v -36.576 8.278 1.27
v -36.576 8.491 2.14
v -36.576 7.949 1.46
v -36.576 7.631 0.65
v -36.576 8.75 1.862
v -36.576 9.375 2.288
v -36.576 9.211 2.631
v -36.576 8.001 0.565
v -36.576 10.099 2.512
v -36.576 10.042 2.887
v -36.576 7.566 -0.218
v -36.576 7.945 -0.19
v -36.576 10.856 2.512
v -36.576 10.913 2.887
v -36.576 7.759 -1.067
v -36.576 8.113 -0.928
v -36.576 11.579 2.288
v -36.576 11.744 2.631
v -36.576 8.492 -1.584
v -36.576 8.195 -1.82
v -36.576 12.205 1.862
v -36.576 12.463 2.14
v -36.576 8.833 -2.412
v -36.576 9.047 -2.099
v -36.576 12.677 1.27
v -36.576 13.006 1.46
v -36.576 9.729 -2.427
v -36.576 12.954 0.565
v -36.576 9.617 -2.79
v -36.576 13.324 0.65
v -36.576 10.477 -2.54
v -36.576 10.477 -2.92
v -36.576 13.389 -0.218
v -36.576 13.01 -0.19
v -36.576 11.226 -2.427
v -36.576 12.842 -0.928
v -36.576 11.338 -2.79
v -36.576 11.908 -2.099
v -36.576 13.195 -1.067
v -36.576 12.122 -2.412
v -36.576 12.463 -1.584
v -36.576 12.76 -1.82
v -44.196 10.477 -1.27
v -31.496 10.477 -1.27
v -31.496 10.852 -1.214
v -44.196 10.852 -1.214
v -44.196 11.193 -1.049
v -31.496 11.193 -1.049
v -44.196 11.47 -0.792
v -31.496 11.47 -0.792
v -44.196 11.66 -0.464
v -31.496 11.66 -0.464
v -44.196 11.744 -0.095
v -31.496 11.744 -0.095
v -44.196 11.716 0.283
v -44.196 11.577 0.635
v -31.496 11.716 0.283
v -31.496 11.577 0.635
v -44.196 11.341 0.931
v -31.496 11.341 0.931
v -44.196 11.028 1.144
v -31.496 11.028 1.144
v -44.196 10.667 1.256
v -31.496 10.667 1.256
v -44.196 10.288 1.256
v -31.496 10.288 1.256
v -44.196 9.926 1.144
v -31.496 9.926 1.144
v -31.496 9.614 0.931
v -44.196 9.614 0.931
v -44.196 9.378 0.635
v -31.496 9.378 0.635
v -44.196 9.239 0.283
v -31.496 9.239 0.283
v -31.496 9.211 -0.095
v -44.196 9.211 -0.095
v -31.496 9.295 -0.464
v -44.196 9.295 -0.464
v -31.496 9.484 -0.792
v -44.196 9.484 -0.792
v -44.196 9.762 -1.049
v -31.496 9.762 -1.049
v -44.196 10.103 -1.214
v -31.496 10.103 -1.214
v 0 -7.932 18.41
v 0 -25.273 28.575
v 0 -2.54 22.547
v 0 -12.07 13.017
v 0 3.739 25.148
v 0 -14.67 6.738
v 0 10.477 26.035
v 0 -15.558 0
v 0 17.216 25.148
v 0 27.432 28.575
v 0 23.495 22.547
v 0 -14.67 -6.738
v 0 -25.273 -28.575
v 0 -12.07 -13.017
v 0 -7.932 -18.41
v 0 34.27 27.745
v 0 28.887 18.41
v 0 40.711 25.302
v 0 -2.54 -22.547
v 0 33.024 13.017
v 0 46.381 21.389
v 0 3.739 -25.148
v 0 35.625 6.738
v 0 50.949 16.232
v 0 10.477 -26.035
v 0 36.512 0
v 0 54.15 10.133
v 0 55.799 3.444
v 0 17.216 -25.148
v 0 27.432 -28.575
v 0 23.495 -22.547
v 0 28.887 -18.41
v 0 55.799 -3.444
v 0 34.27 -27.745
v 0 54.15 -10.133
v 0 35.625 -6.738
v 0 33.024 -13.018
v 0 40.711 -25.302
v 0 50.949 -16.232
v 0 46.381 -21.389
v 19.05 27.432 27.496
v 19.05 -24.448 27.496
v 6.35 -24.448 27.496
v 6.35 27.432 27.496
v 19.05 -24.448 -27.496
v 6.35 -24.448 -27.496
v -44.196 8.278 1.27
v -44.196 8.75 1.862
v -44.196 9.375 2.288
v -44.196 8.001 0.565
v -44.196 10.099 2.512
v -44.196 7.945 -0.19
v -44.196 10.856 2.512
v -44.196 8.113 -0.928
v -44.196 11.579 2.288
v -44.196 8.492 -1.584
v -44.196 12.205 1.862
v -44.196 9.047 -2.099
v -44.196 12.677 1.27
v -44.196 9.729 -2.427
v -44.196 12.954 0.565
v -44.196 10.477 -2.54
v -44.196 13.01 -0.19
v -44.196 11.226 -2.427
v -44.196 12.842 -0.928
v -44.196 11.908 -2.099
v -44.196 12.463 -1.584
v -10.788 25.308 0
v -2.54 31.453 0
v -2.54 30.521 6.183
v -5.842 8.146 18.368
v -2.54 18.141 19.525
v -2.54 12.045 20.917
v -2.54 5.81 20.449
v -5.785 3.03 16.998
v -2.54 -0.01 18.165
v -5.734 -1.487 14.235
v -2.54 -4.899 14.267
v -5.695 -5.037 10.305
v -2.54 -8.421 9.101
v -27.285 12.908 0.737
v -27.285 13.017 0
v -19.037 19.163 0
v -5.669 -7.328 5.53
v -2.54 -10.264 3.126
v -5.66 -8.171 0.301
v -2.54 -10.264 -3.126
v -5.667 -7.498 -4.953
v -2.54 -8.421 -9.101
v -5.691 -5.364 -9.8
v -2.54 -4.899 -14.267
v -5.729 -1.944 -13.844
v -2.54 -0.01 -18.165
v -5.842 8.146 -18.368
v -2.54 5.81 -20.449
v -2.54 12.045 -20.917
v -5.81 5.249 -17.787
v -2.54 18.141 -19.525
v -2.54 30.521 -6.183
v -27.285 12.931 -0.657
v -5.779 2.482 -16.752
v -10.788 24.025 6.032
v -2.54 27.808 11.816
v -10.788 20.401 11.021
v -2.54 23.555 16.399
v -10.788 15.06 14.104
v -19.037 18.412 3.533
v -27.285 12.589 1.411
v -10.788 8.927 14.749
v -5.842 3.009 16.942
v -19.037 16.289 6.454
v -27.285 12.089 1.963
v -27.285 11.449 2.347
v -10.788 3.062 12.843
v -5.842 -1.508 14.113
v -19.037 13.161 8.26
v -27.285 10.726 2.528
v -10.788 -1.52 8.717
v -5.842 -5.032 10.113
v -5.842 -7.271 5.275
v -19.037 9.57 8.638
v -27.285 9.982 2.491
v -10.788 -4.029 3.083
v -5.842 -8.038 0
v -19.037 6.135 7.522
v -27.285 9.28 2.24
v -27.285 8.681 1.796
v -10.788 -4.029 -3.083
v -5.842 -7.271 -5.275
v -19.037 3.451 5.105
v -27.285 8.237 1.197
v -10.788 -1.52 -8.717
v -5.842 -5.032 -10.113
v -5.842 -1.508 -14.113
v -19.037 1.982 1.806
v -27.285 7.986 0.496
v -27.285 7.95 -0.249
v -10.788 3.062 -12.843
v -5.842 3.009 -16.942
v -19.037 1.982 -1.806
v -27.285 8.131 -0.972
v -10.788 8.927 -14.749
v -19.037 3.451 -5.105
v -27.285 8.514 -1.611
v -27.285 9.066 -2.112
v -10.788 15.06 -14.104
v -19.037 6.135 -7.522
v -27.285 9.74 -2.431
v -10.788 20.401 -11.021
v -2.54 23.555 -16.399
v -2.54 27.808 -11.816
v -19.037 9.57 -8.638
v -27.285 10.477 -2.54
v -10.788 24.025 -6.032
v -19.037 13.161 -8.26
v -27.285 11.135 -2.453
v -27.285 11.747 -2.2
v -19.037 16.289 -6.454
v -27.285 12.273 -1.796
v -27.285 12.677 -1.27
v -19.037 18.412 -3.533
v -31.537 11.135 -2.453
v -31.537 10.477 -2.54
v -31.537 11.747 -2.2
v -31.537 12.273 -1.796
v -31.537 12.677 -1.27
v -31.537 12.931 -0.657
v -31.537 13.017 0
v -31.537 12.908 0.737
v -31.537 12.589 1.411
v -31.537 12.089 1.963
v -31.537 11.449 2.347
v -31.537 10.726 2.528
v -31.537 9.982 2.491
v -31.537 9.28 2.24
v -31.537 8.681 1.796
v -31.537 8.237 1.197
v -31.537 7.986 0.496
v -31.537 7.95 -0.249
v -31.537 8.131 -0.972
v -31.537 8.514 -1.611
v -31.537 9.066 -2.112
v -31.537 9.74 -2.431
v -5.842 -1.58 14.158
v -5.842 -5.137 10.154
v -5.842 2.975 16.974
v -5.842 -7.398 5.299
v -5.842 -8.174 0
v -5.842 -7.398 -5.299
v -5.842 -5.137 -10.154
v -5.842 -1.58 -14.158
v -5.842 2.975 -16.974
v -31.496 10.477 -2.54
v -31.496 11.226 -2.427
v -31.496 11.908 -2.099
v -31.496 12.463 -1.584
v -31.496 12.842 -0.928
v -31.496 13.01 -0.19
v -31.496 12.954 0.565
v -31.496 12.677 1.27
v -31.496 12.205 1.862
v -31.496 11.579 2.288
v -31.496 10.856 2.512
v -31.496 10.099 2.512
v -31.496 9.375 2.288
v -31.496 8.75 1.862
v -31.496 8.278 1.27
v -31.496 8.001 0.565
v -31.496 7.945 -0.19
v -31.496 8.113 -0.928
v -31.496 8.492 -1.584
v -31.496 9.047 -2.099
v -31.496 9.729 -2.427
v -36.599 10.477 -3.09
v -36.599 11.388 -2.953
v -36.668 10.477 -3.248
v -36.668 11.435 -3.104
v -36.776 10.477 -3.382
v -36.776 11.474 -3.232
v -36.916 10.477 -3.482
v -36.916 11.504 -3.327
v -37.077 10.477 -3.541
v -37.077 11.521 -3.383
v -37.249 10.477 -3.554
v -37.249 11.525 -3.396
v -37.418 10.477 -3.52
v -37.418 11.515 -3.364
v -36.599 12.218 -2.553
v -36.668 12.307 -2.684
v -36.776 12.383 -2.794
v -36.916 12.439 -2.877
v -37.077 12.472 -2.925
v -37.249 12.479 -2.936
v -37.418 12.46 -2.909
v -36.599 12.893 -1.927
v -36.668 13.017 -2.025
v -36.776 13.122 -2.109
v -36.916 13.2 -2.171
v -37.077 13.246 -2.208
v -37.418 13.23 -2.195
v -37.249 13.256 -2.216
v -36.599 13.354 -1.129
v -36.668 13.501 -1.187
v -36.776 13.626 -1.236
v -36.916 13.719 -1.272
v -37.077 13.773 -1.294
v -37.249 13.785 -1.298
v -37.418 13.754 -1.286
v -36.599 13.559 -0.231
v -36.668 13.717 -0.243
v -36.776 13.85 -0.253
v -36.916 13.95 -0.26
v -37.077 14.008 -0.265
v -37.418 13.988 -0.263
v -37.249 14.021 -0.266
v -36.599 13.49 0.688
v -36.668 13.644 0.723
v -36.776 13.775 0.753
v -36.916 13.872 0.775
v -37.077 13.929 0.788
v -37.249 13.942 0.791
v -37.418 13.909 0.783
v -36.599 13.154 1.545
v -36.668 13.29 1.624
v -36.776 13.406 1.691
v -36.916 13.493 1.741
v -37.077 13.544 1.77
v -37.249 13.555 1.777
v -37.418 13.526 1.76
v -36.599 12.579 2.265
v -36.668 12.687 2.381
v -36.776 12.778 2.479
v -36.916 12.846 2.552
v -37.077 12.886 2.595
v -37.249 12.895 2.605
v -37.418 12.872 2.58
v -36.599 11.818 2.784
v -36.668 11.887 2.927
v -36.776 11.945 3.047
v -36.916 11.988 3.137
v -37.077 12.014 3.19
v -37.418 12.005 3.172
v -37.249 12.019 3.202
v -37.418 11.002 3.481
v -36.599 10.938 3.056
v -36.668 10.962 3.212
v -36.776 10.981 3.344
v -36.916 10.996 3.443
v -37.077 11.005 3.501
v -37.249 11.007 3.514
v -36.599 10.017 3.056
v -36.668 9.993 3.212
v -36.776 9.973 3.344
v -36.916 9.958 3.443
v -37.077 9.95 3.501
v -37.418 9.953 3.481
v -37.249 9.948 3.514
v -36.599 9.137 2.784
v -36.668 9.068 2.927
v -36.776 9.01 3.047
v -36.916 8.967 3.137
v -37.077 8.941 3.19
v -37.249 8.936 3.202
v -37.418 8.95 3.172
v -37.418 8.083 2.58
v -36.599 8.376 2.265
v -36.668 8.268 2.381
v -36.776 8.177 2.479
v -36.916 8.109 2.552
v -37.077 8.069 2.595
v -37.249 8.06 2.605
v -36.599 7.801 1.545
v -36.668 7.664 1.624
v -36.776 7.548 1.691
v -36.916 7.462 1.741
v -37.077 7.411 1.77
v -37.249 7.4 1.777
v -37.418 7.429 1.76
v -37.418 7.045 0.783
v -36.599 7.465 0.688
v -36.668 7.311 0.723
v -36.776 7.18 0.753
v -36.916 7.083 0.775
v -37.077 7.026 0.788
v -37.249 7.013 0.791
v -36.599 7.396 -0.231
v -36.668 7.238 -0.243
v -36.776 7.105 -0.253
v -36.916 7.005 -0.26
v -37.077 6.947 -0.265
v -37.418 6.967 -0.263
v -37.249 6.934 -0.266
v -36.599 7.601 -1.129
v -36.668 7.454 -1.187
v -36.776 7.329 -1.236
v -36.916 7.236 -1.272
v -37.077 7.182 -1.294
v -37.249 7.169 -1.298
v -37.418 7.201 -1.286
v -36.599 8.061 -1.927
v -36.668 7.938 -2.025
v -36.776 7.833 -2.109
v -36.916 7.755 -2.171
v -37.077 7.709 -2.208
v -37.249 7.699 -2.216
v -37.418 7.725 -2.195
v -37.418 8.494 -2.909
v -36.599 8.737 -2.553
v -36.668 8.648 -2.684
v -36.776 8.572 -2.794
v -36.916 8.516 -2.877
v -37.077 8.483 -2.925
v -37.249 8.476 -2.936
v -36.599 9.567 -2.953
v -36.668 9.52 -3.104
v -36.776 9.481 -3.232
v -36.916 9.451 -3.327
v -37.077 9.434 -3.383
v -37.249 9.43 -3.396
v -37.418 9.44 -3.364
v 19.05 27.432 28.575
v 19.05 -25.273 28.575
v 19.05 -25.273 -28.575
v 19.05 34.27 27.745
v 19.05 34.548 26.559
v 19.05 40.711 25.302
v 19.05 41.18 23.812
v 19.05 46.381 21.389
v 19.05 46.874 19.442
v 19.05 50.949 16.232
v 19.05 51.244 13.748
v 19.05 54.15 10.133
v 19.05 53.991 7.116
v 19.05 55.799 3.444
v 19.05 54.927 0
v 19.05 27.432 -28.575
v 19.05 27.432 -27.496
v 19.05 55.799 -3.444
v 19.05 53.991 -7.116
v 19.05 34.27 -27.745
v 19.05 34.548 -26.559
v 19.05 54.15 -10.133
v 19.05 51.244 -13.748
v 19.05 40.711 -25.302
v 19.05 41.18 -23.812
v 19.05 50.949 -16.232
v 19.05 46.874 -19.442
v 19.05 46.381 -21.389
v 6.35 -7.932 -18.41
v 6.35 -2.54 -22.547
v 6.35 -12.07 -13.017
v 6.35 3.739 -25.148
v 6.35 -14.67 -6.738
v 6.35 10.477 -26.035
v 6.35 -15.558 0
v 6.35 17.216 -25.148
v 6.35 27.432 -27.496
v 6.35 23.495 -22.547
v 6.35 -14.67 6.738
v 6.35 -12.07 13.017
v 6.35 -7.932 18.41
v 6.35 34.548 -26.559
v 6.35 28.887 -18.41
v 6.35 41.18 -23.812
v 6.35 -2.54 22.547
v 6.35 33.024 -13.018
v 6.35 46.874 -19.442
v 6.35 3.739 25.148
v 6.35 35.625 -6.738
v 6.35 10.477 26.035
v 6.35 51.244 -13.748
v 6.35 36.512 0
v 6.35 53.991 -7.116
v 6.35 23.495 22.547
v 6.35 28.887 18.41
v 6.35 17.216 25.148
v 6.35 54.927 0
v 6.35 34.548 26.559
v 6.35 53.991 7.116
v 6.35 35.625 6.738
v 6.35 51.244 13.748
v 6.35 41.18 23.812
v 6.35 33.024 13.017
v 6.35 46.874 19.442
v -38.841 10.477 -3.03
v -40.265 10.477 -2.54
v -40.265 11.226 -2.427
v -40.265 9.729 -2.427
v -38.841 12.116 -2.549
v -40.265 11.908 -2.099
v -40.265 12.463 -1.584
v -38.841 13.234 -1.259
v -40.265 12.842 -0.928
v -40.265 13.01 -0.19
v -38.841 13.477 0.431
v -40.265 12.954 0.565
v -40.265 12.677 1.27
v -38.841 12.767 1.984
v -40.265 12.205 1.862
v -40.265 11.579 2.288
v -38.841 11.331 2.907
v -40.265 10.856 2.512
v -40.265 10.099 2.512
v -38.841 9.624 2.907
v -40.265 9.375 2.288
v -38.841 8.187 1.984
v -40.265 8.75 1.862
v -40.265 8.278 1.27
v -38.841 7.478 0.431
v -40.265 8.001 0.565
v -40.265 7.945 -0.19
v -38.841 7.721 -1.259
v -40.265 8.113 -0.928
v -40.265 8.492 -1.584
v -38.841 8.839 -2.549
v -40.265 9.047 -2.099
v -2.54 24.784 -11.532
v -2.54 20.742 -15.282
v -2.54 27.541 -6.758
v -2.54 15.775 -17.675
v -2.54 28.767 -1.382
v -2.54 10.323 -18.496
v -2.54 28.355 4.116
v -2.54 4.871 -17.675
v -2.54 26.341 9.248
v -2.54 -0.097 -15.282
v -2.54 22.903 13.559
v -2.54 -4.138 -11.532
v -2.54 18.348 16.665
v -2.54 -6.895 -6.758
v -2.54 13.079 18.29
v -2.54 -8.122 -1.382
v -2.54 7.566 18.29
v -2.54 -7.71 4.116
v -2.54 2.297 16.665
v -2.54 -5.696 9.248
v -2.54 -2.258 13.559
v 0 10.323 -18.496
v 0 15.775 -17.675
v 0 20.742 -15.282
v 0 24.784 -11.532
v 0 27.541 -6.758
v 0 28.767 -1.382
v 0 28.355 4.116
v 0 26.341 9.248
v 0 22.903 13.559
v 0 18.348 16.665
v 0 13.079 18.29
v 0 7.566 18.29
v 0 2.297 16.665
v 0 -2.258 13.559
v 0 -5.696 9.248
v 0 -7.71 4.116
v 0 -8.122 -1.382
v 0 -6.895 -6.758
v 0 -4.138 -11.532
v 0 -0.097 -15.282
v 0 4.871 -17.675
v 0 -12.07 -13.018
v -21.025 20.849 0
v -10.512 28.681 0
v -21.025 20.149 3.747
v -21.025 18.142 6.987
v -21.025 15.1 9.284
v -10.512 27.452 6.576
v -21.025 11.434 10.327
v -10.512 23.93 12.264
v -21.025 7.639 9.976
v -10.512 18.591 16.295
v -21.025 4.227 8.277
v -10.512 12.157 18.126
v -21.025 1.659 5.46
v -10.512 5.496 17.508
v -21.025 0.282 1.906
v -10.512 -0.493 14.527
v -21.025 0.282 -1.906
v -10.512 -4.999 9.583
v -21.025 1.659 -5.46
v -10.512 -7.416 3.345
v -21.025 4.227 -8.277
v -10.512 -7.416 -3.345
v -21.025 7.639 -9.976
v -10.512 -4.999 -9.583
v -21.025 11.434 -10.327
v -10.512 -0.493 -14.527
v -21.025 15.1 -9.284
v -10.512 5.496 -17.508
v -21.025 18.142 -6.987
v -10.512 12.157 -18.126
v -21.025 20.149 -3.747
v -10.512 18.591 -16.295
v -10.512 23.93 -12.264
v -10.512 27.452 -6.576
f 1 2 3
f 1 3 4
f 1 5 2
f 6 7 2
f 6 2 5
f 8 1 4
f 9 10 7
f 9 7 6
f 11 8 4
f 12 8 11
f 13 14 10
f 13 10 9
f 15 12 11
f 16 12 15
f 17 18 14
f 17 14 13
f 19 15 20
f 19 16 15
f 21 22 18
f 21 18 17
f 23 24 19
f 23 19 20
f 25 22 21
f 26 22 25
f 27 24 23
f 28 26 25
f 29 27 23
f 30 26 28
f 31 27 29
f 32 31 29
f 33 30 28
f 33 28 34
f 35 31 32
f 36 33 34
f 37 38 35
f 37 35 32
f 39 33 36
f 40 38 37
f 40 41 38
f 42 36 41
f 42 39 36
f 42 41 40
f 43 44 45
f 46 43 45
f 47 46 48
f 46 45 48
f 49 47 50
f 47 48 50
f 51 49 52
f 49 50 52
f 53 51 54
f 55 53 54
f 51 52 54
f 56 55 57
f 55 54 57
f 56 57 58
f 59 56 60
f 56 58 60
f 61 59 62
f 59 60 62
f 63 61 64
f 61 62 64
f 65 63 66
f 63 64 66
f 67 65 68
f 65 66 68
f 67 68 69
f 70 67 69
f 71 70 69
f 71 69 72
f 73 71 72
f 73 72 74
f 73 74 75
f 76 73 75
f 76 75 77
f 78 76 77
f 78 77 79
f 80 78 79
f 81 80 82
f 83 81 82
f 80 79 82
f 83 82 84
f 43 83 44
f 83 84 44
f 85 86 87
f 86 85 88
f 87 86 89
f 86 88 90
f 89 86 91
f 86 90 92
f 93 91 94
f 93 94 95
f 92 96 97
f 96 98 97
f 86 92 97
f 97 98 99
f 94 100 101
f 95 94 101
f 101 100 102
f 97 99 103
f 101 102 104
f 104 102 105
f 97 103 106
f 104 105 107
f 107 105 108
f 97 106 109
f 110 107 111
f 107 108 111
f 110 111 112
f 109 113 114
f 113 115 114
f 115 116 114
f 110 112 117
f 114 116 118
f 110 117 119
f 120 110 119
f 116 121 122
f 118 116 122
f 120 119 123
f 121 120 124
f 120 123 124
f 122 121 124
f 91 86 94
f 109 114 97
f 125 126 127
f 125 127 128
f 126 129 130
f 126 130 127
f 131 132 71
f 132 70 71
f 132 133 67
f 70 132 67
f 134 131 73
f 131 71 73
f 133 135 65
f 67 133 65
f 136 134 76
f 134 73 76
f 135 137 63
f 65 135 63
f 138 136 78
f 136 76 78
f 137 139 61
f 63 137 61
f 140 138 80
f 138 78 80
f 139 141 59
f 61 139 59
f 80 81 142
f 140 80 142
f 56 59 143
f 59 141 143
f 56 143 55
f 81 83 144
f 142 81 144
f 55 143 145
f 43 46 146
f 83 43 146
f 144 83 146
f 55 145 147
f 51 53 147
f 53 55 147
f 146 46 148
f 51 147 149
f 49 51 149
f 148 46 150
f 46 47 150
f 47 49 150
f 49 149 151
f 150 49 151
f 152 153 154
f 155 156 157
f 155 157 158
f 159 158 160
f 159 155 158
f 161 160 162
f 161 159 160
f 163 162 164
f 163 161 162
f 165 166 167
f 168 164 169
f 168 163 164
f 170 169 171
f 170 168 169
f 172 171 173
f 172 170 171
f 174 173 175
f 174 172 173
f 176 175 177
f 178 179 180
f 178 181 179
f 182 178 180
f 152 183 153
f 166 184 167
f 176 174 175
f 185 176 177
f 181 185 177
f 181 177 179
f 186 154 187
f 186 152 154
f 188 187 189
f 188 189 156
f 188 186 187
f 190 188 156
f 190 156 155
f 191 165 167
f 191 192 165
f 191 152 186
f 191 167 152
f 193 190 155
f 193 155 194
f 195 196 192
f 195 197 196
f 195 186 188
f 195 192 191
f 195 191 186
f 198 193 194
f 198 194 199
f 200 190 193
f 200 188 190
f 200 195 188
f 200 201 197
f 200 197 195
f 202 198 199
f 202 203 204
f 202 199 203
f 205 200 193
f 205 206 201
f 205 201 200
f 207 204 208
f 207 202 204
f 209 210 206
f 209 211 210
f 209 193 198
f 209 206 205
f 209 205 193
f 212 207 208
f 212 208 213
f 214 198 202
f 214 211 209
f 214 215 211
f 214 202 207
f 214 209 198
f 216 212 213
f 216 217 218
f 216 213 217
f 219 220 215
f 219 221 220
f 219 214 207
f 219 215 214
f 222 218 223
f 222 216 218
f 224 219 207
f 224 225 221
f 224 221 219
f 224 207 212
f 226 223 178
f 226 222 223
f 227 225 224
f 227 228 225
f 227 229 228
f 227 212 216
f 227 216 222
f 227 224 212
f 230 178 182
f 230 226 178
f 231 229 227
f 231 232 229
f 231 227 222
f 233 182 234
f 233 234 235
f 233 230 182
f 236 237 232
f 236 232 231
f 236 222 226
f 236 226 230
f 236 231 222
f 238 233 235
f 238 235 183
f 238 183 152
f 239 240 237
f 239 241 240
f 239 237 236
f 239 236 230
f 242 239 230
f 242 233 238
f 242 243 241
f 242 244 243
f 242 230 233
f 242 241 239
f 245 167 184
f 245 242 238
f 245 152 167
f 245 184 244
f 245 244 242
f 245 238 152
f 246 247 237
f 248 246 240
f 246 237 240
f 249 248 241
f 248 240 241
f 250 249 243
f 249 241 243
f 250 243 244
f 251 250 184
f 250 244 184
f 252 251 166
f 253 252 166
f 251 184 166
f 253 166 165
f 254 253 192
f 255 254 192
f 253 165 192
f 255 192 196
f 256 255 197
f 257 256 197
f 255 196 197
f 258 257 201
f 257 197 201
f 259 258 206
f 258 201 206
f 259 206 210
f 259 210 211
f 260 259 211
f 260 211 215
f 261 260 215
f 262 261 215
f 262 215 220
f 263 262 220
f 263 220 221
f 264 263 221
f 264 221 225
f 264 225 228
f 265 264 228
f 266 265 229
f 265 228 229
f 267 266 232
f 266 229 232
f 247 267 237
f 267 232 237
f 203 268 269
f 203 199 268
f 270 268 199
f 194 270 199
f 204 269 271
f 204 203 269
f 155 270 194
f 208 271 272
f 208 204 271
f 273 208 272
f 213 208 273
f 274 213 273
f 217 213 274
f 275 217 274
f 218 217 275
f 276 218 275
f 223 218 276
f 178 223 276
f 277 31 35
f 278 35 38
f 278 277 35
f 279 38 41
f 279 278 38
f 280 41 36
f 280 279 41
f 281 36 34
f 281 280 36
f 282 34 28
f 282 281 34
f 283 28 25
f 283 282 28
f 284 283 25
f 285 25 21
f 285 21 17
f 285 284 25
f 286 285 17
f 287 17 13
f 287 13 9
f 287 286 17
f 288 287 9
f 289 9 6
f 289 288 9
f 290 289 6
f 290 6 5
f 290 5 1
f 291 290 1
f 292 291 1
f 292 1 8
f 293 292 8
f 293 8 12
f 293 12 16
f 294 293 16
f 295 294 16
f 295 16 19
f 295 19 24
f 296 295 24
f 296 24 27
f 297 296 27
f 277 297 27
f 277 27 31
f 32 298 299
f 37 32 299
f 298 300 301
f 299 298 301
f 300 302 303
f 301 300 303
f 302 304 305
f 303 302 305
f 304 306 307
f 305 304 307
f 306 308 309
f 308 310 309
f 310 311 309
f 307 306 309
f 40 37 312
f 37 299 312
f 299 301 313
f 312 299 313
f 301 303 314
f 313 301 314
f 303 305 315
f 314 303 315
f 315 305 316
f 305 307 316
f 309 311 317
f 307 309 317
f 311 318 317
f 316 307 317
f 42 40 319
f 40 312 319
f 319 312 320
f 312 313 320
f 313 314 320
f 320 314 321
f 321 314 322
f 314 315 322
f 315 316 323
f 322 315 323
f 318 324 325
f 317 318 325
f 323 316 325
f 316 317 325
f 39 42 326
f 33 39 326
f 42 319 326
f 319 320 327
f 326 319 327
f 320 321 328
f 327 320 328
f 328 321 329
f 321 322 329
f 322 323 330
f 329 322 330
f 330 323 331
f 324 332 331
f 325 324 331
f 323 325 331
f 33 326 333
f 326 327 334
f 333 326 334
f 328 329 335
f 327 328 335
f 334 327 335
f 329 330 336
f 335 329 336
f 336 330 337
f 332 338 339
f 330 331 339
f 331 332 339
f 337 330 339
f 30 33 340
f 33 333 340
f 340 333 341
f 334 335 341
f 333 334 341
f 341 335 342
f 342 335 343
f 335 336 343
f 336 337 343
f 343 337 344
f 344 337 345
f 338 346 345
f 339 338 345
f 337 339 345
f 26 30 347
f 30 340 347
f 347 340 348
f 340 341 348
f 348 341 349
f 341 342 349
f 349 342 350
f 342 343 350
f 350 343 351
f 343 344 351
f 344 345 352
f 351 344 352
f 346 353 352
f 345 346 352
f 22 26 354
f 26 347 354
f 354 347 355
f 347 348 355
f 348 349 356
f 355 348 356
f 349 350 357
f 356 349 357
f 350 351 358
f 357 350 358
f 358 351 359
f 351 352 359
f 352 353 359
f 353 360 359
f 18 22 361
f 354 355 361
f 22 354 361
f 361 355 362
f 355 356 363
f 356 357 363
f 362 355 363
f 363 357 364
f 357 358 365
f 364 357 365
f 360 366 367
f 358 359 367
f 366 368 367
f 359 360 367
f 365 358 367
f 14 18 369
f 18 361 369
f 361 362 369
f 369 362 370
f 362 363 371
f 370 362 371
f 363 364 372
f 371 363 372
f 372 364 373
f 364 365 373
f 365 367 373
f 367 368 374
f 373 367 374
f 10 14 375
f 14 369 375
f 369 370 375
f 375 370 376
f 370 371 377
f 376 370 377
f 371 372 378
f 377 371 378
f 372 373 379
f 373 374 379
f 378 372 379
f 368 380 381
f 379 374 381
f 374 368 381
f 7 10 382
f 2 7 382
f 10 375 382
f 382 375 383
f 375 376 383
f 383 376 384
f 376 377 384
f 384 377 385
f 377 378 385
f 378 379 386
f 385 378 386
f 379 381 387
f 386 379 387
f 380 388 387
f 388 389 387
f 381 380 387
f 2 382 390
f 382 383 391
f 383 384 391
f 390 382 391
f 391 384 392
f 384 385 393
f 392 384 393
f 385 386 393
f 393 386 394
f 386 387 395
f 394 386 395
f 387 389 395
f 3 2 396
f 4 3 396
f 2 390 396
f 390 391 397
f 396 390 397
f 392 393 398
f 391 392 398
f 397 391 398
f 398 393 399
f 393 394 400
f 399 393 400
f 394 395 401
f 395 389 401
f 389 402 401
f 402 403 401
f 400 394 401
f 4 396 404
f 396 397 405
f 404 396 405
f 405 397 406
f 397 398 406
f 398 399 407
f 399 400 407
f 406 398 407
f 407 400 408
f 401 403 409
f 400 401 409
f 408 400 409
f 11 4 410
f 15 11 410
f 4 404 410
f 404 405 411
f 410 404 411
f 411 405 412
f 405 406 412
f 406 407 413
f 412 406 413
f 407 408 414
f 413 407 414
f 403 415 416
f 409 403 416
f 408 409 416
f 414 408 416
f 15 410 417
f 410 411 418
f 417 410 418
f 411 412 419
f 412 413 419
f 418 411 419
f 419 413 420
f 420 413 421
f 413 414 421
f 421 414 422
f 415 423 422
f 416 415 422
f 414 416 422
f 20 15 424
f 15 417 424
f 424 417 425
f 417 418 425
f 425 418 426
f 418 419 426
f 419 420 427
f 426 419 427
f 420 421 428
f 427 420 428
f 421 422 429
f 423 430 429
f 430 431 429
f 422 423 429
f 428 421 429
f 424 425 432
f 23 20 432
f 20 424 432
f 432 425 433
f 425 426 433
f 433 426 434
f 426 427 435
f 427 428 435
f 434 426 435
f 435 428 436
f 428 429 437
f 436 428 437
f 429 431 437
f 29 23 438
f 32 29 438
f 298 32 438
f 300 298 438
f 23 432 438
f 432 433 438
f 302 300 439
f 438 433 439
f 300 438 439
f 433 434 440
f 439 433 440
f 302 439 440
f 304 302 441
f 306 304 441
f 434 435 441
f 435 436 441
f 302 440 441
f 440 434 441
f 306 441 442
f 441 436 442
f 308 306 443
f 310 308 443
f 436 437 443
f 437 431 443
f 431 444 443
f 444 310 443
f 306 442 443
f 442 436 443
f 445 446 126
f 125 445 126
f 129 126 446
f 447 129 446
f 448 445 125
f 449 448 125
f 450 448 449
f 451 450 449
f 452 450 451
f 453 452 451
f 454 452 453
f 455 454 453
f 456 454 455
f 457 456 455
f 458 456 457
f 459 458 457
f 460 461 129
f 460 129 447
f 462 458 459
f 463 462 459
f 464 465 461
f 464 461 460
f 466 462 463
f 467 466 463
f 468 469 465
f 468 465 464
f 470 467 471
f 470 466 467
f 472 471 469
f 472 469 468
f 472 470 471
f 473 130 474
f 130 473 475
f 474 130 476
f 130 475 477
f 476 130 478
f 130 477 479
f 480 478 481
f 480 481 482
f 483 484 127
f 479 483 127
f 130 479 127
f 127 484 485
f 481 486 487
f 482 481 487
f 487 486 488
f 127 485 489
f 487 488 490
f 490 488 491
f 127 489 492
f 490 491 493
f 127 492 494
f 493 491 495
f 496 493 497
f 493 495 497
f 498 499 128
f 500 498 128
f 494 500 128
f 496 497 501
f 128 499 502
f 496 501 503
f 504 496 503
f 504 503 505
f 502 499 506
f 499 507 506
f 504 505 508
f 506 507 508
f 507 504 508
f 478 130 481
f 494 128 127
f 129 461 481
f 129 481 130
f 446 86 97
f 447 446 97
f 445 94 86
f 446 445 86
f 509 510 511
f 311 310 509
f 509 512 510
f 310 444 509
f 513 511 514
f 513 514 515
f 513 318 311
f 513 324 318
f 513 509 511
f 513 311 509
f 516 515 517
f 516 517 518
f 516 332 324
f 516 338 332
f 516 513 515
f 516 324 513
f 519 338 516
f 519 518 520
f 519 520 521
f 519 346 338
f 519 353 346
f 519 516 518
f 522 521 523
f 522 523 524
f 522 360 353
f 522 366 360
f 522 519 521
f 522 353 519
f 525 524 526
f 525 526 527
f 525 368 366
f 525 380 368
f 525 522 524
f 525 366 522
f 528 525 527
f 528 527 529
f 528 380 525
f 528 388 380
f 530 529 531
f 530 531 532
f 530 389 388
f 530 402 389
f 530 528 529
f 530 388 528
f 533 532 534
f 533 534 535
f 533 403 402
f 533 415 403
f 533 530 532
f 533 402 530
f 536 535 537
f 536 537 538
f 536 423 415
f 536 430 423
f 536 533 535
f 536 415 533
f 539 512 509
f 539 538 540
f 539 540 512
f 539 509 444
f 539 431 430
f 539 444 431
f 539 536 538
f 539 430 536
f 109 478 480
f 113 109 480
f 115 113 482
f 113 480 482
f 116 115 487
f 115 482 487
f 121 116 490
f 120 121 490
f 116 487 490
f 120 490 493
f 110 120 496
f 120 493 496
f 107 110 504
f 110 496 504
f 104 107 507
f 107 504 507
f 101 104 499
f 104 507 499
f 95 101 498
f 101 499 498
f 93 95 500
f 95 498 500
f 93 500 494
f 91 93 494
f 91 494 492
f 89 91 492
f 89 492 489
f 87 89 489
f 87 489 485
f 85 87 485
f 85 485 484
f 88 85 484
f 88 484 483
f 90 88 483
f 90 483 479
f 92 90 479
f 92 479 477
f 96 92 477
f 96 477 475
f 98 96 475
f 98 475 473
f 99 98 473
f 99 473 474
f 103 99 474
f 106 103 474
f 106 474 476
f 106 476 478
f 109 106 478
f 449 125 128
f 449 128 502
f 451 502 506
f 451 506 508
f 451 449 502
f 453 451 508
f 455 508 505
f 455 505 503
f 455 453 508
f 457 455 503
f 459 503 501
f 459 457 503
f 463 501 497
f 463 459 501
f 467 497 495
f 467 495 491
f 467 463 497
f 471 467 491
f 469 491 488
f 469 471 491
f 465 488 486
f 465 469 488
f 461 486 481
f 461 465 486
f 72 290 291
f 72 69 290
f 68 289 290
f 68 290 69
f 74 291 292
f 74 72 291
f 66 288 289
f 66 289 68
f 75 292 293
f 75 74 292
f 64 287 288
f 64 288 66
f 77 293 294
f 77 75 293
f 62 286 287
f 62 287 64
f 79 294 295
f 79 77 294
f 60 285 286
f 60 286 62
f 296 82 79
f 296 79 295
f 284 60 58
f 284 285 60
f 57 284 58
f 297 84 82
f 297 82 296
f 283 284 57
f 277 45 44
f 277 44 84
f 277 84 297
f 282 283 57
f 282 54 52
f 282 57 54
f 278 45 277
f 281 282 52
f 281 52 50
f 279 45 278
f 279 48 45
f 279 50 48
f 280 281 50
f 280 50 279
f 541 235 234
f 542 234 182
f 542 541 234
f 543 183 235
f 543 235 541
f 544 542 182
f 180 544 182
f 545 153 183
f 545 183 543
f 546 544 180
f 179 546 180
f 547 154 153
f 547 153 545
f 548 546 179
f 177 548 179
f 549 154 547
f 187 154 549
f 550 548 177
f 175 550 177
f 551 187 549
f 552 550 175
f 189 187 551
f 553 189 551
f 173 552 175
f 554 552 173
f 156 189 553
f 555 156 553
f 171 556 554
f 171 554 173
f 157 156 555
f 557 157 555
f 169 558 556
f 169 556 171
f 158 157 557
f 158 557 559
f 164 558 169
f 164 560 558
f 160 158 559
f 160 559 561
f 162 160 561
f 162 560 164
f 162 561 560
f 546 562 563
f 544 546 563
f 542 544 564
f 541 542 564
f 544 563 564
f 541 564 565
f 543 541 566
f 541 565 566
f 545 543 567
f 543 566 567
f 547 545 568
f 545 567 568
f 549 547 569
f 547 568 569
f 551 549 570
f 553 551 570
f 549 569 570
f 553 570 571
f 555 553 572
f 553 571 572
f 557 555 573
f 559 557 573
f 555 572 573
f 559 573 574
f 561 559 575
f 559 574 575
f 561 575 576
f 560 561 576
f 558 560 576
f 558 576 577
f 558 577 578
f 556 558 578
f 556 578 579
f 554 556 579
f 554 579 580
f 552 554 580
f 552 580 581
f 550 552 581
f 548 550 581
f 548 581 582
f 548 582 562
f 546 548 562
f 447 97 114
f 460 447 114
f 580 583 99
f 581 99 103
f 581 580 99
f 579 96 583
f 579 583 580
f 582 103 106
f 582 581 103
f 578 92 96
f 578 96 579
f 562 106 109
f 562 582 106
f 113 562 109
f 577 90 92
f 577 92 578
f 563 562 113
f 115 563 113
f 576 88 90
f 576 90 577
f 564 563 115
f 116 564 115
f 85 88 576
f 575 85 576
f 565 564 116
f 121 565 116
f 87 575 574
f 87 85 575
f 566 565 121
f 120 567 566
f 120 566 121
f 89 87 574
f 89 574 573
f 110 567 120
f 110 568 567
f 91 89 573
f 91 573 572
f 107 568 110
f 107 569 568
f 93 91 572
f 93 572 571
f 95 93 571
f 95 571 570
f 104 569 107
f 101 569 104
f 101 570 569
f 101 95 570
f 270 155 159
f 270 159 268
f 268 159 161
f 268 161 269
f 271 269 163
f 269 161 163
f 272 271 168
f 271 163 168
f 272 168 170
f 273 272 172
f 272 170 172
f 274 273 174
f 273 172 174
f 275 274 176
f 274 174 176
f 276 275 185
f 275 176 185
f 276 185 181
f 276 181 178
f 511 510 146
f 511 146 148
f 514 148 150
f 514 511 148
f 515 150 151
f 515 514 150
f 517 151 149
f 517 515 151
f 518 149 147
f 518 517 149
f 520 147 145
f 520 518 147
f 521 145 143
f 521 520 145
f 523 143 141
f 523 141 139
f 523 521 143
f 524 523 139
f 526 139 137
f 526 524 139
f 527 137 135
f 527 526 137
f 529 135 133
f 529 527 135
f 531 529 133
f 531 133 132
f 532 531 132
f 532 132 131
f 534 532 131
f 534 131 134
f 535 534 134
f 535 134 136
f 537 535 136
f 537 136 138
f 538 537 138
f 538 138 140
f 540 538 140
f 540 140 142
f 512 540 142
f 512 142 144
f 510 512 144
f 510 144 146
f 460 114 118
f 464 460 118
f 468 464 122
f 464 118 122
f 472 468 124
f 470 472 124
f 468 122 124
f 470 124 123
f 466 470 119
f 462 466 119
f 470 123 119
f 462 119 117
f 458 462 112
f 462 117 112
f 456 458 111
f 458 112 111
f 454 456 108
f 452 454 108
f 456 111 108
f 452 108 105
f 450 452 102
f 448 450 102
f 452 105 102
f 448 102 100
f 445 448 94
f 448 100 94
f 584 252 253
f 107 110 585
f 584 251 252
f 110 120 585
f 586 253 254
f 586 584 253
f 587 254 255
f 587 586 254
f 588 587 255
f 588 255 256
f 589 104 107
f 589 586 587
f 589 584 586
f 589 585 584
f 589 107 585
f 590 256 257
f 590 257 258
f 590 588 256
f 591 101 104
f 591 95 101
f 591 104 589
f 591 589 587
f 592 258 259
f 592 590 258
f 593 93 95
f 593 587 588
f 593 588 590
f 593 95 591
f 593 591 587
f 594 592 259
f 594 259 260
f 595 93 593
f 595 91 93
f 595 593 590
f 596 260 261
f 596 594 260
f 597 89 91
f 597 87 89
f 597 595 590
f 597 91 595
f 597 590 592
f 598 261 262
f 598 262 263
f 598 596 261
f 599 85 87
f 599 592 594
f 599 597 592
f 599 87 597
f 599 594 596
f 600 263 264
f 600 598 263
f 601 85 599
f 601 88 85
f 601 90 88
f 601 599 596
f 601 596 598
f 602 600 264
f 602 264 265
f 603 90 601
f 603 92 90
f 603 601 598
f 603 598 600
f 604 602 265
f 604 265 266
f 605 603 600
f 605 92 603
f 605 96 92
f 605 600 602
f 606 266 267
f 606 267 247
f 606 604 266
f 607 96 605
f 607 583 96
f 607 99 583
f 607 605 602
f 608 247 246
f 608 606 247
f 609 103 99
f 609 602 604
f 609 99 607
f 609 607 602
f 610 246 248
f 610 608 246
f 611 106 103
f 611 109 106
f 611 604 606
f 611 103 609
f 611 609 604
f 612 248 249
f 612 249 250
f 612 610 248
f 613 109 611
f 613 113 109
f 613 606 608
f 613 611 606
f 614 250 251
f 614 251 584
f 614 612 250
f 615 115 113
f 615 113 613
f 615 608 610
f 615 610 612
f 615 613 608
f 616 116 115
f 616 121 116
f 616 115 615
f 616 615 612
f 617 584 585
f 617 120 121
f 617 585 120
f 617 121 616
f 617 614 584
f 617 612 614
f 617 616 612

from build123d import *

# Parameters (mm, degrees)
BOSS_EXTRUDE1_DEPTH = 19.05
CUT_EXTRUDE1_DEPTH  = 12.7
SKETCH4_R           = 26.035
CUT_EXTRUDE2_DEPTH  = 65.145109252
SKETCH7_R           = 18.496466633
CUT_EXTRUDE3_DEPTH  = 5.842
SKETCH8_R           = 2.54
CUT_EXTRUDE4_DEPTH  = 60.96
SKETCH9_R           = 2.54
SKETCH9_R_2         = 1.27
EXTRUDE_THIN1_DEPTH = 12.7
FILLET1_R           = 0.635


# Read off the part's stored shape, not the designer's step: Revolve-Thin4
with BuildPart() as part:
    # Sketch2 → Boss-Extrude1 (new body)
    with BuildSketch(Plane(origin=(0, 0, 0), x_dir=(0, 0, -1), z_dir=(1, 0, 0))):
        with BuildLine():
            Line((-28.575, 27.431914001), (-28.575, -25.273085999))
            Line((-28.575, -25.273085999), (28.575, -25.273085999))
            Line((28.575, -25.273085999), (28.575, 27.431914001))
            ThreePointArc((28.575, 27.431914001), (0, 56.006914001), (-28.575, 27.431914001))
        make_face()
    extrude(amount=BOSS_EXTRUDE1_DEPTH)

    # Sketch3 → Cut-Extrude1 (cut)
    with BuildSketch(Plane(origin=(19.05, 0, 0), x_dir=(0, 0, -1), z_dir=(1, 0, 0))):
        with BuildLine():
            Line((27.4955, 27.431914001), (27.4955, -24.447585999))
            Line((27.4955, -24.447585999), (-27.4955, -24.447585999))
            Line((-27.4955, -24.447585999), (-27.4955, 27.431914001))
            ThreePointArc((-27.4955, 27.431914001), (0, 54.927414001), (27.4955, 27.431914001))
        make_face()
    extrude(amount=-CUT_EXTRUDE1_DEPTH, mode=Mode.SUBTRACT)

    # Sketch4 → Cut-Extrude2 (cut, through all)
    with BuildSketch(Plane(origin=(6.35, 0, 0), x_dir=(0, 0, -1), z_dir=(1, 0, 0))):
        with Locations((0, 10.477414001)):
            Circle(SKETCH4_R)
    extrude(amount=-CUT_EXTRUDE2_DEPTH, mode=Mode.SUBTRACT)


with BuildPart() as body_2:
    # Revolve-Thin4 outline → Revolve-Thin4 (revolve)
    with BuildSketch(Plane(origin=(0, 10.477414001, 0), x_dir=(0, 1, 0), z_dir=(0, 0, -1))):
        Polygon((0, 0), (0, -31.75), (2.38125, -31.75), (26.035, 0), align=None)
        Polygon((2.54, -27.285374101), (2.54, -2.54), (20.975303705, -2.54), align=None, mode=Mode.SUBTRACT)
    revolve(axis=Axis((0, 10.477414001, 0), (1, 0, 0)))

    # Sketch7 → Cut-Extrude3 (cut)
    with BuildSketch(Plane(origin=(0, 0, 0), x_dir=(0, 0, -1), z_dir=(1, 0, 0))):
        with Locations((0, 10.322694798)):
            Circle(SKETCH7_R)
    extrude(amount=-CUT_EXTRUDE3_DEPTH, mode=Mode.SUBTRACT)

    # Sketch8 → Cut-Extrude4 (cut)
    with BuildSketch(Plane(origin=(-5.842, 0, 0), x_dir=(0, 0, -1), z_dir=(1, 0, 0))):
        with Locations((0, 10.477414001)):
            Circle(SKETCH8_R)
    extrude(amount=-CUT_EXTRUDE4_DEPTH, mode=Mode.SUBTRACT)


with BuildPart() as body_3:
    # Sketch9 → Extrude-Thin1 (new body)
    with BuildSketch(Plane(origin=(-31.496, 0, 0), x_dir=(0, 0, -1), z_dir=(1, 0, 0))):
        with Locations((0, 10.477414001)):
            Circle(SKETCH9_R)
        with Locations((0, 10.477414001)):
            Circle(SKETCH9_R_2, mode=Mode.SUBTRACT)
    extrude(amount=-EXTRUDE_THIN1_DEPTH)

    # Sketch10 → Revolve1 (revolve)
    with BuildSketch(Plane(origin=(0, 0, 0), x_dir=(-1, 0, 0), z_dir=(0, 0, -1)), mode=Mode.PRIVATE) as revolve1_sk:
        Polygon((40.264616111, 7.937414001), (36.576, 6.667414001), (36.576, 7.937414001), align=None)
    revolve(revolve1_sk.sketch.rotate(Axis((0, 10.477414001, 0), (1, 0, 0)), 90), axis=Axis((0, 10.477414001, 0), (1, 0, 0)))

    # Fillet1
    fillet1_edges = [body_3.edges().sort_by_distance(p)[0] for p in [
        (-36.576, 10.477414001, 3.81),
    ]]
    fillet(fillet1_edges, radius=FILLET1_R)


solid = Compound([part.part, body_2.part, body_3.part])
